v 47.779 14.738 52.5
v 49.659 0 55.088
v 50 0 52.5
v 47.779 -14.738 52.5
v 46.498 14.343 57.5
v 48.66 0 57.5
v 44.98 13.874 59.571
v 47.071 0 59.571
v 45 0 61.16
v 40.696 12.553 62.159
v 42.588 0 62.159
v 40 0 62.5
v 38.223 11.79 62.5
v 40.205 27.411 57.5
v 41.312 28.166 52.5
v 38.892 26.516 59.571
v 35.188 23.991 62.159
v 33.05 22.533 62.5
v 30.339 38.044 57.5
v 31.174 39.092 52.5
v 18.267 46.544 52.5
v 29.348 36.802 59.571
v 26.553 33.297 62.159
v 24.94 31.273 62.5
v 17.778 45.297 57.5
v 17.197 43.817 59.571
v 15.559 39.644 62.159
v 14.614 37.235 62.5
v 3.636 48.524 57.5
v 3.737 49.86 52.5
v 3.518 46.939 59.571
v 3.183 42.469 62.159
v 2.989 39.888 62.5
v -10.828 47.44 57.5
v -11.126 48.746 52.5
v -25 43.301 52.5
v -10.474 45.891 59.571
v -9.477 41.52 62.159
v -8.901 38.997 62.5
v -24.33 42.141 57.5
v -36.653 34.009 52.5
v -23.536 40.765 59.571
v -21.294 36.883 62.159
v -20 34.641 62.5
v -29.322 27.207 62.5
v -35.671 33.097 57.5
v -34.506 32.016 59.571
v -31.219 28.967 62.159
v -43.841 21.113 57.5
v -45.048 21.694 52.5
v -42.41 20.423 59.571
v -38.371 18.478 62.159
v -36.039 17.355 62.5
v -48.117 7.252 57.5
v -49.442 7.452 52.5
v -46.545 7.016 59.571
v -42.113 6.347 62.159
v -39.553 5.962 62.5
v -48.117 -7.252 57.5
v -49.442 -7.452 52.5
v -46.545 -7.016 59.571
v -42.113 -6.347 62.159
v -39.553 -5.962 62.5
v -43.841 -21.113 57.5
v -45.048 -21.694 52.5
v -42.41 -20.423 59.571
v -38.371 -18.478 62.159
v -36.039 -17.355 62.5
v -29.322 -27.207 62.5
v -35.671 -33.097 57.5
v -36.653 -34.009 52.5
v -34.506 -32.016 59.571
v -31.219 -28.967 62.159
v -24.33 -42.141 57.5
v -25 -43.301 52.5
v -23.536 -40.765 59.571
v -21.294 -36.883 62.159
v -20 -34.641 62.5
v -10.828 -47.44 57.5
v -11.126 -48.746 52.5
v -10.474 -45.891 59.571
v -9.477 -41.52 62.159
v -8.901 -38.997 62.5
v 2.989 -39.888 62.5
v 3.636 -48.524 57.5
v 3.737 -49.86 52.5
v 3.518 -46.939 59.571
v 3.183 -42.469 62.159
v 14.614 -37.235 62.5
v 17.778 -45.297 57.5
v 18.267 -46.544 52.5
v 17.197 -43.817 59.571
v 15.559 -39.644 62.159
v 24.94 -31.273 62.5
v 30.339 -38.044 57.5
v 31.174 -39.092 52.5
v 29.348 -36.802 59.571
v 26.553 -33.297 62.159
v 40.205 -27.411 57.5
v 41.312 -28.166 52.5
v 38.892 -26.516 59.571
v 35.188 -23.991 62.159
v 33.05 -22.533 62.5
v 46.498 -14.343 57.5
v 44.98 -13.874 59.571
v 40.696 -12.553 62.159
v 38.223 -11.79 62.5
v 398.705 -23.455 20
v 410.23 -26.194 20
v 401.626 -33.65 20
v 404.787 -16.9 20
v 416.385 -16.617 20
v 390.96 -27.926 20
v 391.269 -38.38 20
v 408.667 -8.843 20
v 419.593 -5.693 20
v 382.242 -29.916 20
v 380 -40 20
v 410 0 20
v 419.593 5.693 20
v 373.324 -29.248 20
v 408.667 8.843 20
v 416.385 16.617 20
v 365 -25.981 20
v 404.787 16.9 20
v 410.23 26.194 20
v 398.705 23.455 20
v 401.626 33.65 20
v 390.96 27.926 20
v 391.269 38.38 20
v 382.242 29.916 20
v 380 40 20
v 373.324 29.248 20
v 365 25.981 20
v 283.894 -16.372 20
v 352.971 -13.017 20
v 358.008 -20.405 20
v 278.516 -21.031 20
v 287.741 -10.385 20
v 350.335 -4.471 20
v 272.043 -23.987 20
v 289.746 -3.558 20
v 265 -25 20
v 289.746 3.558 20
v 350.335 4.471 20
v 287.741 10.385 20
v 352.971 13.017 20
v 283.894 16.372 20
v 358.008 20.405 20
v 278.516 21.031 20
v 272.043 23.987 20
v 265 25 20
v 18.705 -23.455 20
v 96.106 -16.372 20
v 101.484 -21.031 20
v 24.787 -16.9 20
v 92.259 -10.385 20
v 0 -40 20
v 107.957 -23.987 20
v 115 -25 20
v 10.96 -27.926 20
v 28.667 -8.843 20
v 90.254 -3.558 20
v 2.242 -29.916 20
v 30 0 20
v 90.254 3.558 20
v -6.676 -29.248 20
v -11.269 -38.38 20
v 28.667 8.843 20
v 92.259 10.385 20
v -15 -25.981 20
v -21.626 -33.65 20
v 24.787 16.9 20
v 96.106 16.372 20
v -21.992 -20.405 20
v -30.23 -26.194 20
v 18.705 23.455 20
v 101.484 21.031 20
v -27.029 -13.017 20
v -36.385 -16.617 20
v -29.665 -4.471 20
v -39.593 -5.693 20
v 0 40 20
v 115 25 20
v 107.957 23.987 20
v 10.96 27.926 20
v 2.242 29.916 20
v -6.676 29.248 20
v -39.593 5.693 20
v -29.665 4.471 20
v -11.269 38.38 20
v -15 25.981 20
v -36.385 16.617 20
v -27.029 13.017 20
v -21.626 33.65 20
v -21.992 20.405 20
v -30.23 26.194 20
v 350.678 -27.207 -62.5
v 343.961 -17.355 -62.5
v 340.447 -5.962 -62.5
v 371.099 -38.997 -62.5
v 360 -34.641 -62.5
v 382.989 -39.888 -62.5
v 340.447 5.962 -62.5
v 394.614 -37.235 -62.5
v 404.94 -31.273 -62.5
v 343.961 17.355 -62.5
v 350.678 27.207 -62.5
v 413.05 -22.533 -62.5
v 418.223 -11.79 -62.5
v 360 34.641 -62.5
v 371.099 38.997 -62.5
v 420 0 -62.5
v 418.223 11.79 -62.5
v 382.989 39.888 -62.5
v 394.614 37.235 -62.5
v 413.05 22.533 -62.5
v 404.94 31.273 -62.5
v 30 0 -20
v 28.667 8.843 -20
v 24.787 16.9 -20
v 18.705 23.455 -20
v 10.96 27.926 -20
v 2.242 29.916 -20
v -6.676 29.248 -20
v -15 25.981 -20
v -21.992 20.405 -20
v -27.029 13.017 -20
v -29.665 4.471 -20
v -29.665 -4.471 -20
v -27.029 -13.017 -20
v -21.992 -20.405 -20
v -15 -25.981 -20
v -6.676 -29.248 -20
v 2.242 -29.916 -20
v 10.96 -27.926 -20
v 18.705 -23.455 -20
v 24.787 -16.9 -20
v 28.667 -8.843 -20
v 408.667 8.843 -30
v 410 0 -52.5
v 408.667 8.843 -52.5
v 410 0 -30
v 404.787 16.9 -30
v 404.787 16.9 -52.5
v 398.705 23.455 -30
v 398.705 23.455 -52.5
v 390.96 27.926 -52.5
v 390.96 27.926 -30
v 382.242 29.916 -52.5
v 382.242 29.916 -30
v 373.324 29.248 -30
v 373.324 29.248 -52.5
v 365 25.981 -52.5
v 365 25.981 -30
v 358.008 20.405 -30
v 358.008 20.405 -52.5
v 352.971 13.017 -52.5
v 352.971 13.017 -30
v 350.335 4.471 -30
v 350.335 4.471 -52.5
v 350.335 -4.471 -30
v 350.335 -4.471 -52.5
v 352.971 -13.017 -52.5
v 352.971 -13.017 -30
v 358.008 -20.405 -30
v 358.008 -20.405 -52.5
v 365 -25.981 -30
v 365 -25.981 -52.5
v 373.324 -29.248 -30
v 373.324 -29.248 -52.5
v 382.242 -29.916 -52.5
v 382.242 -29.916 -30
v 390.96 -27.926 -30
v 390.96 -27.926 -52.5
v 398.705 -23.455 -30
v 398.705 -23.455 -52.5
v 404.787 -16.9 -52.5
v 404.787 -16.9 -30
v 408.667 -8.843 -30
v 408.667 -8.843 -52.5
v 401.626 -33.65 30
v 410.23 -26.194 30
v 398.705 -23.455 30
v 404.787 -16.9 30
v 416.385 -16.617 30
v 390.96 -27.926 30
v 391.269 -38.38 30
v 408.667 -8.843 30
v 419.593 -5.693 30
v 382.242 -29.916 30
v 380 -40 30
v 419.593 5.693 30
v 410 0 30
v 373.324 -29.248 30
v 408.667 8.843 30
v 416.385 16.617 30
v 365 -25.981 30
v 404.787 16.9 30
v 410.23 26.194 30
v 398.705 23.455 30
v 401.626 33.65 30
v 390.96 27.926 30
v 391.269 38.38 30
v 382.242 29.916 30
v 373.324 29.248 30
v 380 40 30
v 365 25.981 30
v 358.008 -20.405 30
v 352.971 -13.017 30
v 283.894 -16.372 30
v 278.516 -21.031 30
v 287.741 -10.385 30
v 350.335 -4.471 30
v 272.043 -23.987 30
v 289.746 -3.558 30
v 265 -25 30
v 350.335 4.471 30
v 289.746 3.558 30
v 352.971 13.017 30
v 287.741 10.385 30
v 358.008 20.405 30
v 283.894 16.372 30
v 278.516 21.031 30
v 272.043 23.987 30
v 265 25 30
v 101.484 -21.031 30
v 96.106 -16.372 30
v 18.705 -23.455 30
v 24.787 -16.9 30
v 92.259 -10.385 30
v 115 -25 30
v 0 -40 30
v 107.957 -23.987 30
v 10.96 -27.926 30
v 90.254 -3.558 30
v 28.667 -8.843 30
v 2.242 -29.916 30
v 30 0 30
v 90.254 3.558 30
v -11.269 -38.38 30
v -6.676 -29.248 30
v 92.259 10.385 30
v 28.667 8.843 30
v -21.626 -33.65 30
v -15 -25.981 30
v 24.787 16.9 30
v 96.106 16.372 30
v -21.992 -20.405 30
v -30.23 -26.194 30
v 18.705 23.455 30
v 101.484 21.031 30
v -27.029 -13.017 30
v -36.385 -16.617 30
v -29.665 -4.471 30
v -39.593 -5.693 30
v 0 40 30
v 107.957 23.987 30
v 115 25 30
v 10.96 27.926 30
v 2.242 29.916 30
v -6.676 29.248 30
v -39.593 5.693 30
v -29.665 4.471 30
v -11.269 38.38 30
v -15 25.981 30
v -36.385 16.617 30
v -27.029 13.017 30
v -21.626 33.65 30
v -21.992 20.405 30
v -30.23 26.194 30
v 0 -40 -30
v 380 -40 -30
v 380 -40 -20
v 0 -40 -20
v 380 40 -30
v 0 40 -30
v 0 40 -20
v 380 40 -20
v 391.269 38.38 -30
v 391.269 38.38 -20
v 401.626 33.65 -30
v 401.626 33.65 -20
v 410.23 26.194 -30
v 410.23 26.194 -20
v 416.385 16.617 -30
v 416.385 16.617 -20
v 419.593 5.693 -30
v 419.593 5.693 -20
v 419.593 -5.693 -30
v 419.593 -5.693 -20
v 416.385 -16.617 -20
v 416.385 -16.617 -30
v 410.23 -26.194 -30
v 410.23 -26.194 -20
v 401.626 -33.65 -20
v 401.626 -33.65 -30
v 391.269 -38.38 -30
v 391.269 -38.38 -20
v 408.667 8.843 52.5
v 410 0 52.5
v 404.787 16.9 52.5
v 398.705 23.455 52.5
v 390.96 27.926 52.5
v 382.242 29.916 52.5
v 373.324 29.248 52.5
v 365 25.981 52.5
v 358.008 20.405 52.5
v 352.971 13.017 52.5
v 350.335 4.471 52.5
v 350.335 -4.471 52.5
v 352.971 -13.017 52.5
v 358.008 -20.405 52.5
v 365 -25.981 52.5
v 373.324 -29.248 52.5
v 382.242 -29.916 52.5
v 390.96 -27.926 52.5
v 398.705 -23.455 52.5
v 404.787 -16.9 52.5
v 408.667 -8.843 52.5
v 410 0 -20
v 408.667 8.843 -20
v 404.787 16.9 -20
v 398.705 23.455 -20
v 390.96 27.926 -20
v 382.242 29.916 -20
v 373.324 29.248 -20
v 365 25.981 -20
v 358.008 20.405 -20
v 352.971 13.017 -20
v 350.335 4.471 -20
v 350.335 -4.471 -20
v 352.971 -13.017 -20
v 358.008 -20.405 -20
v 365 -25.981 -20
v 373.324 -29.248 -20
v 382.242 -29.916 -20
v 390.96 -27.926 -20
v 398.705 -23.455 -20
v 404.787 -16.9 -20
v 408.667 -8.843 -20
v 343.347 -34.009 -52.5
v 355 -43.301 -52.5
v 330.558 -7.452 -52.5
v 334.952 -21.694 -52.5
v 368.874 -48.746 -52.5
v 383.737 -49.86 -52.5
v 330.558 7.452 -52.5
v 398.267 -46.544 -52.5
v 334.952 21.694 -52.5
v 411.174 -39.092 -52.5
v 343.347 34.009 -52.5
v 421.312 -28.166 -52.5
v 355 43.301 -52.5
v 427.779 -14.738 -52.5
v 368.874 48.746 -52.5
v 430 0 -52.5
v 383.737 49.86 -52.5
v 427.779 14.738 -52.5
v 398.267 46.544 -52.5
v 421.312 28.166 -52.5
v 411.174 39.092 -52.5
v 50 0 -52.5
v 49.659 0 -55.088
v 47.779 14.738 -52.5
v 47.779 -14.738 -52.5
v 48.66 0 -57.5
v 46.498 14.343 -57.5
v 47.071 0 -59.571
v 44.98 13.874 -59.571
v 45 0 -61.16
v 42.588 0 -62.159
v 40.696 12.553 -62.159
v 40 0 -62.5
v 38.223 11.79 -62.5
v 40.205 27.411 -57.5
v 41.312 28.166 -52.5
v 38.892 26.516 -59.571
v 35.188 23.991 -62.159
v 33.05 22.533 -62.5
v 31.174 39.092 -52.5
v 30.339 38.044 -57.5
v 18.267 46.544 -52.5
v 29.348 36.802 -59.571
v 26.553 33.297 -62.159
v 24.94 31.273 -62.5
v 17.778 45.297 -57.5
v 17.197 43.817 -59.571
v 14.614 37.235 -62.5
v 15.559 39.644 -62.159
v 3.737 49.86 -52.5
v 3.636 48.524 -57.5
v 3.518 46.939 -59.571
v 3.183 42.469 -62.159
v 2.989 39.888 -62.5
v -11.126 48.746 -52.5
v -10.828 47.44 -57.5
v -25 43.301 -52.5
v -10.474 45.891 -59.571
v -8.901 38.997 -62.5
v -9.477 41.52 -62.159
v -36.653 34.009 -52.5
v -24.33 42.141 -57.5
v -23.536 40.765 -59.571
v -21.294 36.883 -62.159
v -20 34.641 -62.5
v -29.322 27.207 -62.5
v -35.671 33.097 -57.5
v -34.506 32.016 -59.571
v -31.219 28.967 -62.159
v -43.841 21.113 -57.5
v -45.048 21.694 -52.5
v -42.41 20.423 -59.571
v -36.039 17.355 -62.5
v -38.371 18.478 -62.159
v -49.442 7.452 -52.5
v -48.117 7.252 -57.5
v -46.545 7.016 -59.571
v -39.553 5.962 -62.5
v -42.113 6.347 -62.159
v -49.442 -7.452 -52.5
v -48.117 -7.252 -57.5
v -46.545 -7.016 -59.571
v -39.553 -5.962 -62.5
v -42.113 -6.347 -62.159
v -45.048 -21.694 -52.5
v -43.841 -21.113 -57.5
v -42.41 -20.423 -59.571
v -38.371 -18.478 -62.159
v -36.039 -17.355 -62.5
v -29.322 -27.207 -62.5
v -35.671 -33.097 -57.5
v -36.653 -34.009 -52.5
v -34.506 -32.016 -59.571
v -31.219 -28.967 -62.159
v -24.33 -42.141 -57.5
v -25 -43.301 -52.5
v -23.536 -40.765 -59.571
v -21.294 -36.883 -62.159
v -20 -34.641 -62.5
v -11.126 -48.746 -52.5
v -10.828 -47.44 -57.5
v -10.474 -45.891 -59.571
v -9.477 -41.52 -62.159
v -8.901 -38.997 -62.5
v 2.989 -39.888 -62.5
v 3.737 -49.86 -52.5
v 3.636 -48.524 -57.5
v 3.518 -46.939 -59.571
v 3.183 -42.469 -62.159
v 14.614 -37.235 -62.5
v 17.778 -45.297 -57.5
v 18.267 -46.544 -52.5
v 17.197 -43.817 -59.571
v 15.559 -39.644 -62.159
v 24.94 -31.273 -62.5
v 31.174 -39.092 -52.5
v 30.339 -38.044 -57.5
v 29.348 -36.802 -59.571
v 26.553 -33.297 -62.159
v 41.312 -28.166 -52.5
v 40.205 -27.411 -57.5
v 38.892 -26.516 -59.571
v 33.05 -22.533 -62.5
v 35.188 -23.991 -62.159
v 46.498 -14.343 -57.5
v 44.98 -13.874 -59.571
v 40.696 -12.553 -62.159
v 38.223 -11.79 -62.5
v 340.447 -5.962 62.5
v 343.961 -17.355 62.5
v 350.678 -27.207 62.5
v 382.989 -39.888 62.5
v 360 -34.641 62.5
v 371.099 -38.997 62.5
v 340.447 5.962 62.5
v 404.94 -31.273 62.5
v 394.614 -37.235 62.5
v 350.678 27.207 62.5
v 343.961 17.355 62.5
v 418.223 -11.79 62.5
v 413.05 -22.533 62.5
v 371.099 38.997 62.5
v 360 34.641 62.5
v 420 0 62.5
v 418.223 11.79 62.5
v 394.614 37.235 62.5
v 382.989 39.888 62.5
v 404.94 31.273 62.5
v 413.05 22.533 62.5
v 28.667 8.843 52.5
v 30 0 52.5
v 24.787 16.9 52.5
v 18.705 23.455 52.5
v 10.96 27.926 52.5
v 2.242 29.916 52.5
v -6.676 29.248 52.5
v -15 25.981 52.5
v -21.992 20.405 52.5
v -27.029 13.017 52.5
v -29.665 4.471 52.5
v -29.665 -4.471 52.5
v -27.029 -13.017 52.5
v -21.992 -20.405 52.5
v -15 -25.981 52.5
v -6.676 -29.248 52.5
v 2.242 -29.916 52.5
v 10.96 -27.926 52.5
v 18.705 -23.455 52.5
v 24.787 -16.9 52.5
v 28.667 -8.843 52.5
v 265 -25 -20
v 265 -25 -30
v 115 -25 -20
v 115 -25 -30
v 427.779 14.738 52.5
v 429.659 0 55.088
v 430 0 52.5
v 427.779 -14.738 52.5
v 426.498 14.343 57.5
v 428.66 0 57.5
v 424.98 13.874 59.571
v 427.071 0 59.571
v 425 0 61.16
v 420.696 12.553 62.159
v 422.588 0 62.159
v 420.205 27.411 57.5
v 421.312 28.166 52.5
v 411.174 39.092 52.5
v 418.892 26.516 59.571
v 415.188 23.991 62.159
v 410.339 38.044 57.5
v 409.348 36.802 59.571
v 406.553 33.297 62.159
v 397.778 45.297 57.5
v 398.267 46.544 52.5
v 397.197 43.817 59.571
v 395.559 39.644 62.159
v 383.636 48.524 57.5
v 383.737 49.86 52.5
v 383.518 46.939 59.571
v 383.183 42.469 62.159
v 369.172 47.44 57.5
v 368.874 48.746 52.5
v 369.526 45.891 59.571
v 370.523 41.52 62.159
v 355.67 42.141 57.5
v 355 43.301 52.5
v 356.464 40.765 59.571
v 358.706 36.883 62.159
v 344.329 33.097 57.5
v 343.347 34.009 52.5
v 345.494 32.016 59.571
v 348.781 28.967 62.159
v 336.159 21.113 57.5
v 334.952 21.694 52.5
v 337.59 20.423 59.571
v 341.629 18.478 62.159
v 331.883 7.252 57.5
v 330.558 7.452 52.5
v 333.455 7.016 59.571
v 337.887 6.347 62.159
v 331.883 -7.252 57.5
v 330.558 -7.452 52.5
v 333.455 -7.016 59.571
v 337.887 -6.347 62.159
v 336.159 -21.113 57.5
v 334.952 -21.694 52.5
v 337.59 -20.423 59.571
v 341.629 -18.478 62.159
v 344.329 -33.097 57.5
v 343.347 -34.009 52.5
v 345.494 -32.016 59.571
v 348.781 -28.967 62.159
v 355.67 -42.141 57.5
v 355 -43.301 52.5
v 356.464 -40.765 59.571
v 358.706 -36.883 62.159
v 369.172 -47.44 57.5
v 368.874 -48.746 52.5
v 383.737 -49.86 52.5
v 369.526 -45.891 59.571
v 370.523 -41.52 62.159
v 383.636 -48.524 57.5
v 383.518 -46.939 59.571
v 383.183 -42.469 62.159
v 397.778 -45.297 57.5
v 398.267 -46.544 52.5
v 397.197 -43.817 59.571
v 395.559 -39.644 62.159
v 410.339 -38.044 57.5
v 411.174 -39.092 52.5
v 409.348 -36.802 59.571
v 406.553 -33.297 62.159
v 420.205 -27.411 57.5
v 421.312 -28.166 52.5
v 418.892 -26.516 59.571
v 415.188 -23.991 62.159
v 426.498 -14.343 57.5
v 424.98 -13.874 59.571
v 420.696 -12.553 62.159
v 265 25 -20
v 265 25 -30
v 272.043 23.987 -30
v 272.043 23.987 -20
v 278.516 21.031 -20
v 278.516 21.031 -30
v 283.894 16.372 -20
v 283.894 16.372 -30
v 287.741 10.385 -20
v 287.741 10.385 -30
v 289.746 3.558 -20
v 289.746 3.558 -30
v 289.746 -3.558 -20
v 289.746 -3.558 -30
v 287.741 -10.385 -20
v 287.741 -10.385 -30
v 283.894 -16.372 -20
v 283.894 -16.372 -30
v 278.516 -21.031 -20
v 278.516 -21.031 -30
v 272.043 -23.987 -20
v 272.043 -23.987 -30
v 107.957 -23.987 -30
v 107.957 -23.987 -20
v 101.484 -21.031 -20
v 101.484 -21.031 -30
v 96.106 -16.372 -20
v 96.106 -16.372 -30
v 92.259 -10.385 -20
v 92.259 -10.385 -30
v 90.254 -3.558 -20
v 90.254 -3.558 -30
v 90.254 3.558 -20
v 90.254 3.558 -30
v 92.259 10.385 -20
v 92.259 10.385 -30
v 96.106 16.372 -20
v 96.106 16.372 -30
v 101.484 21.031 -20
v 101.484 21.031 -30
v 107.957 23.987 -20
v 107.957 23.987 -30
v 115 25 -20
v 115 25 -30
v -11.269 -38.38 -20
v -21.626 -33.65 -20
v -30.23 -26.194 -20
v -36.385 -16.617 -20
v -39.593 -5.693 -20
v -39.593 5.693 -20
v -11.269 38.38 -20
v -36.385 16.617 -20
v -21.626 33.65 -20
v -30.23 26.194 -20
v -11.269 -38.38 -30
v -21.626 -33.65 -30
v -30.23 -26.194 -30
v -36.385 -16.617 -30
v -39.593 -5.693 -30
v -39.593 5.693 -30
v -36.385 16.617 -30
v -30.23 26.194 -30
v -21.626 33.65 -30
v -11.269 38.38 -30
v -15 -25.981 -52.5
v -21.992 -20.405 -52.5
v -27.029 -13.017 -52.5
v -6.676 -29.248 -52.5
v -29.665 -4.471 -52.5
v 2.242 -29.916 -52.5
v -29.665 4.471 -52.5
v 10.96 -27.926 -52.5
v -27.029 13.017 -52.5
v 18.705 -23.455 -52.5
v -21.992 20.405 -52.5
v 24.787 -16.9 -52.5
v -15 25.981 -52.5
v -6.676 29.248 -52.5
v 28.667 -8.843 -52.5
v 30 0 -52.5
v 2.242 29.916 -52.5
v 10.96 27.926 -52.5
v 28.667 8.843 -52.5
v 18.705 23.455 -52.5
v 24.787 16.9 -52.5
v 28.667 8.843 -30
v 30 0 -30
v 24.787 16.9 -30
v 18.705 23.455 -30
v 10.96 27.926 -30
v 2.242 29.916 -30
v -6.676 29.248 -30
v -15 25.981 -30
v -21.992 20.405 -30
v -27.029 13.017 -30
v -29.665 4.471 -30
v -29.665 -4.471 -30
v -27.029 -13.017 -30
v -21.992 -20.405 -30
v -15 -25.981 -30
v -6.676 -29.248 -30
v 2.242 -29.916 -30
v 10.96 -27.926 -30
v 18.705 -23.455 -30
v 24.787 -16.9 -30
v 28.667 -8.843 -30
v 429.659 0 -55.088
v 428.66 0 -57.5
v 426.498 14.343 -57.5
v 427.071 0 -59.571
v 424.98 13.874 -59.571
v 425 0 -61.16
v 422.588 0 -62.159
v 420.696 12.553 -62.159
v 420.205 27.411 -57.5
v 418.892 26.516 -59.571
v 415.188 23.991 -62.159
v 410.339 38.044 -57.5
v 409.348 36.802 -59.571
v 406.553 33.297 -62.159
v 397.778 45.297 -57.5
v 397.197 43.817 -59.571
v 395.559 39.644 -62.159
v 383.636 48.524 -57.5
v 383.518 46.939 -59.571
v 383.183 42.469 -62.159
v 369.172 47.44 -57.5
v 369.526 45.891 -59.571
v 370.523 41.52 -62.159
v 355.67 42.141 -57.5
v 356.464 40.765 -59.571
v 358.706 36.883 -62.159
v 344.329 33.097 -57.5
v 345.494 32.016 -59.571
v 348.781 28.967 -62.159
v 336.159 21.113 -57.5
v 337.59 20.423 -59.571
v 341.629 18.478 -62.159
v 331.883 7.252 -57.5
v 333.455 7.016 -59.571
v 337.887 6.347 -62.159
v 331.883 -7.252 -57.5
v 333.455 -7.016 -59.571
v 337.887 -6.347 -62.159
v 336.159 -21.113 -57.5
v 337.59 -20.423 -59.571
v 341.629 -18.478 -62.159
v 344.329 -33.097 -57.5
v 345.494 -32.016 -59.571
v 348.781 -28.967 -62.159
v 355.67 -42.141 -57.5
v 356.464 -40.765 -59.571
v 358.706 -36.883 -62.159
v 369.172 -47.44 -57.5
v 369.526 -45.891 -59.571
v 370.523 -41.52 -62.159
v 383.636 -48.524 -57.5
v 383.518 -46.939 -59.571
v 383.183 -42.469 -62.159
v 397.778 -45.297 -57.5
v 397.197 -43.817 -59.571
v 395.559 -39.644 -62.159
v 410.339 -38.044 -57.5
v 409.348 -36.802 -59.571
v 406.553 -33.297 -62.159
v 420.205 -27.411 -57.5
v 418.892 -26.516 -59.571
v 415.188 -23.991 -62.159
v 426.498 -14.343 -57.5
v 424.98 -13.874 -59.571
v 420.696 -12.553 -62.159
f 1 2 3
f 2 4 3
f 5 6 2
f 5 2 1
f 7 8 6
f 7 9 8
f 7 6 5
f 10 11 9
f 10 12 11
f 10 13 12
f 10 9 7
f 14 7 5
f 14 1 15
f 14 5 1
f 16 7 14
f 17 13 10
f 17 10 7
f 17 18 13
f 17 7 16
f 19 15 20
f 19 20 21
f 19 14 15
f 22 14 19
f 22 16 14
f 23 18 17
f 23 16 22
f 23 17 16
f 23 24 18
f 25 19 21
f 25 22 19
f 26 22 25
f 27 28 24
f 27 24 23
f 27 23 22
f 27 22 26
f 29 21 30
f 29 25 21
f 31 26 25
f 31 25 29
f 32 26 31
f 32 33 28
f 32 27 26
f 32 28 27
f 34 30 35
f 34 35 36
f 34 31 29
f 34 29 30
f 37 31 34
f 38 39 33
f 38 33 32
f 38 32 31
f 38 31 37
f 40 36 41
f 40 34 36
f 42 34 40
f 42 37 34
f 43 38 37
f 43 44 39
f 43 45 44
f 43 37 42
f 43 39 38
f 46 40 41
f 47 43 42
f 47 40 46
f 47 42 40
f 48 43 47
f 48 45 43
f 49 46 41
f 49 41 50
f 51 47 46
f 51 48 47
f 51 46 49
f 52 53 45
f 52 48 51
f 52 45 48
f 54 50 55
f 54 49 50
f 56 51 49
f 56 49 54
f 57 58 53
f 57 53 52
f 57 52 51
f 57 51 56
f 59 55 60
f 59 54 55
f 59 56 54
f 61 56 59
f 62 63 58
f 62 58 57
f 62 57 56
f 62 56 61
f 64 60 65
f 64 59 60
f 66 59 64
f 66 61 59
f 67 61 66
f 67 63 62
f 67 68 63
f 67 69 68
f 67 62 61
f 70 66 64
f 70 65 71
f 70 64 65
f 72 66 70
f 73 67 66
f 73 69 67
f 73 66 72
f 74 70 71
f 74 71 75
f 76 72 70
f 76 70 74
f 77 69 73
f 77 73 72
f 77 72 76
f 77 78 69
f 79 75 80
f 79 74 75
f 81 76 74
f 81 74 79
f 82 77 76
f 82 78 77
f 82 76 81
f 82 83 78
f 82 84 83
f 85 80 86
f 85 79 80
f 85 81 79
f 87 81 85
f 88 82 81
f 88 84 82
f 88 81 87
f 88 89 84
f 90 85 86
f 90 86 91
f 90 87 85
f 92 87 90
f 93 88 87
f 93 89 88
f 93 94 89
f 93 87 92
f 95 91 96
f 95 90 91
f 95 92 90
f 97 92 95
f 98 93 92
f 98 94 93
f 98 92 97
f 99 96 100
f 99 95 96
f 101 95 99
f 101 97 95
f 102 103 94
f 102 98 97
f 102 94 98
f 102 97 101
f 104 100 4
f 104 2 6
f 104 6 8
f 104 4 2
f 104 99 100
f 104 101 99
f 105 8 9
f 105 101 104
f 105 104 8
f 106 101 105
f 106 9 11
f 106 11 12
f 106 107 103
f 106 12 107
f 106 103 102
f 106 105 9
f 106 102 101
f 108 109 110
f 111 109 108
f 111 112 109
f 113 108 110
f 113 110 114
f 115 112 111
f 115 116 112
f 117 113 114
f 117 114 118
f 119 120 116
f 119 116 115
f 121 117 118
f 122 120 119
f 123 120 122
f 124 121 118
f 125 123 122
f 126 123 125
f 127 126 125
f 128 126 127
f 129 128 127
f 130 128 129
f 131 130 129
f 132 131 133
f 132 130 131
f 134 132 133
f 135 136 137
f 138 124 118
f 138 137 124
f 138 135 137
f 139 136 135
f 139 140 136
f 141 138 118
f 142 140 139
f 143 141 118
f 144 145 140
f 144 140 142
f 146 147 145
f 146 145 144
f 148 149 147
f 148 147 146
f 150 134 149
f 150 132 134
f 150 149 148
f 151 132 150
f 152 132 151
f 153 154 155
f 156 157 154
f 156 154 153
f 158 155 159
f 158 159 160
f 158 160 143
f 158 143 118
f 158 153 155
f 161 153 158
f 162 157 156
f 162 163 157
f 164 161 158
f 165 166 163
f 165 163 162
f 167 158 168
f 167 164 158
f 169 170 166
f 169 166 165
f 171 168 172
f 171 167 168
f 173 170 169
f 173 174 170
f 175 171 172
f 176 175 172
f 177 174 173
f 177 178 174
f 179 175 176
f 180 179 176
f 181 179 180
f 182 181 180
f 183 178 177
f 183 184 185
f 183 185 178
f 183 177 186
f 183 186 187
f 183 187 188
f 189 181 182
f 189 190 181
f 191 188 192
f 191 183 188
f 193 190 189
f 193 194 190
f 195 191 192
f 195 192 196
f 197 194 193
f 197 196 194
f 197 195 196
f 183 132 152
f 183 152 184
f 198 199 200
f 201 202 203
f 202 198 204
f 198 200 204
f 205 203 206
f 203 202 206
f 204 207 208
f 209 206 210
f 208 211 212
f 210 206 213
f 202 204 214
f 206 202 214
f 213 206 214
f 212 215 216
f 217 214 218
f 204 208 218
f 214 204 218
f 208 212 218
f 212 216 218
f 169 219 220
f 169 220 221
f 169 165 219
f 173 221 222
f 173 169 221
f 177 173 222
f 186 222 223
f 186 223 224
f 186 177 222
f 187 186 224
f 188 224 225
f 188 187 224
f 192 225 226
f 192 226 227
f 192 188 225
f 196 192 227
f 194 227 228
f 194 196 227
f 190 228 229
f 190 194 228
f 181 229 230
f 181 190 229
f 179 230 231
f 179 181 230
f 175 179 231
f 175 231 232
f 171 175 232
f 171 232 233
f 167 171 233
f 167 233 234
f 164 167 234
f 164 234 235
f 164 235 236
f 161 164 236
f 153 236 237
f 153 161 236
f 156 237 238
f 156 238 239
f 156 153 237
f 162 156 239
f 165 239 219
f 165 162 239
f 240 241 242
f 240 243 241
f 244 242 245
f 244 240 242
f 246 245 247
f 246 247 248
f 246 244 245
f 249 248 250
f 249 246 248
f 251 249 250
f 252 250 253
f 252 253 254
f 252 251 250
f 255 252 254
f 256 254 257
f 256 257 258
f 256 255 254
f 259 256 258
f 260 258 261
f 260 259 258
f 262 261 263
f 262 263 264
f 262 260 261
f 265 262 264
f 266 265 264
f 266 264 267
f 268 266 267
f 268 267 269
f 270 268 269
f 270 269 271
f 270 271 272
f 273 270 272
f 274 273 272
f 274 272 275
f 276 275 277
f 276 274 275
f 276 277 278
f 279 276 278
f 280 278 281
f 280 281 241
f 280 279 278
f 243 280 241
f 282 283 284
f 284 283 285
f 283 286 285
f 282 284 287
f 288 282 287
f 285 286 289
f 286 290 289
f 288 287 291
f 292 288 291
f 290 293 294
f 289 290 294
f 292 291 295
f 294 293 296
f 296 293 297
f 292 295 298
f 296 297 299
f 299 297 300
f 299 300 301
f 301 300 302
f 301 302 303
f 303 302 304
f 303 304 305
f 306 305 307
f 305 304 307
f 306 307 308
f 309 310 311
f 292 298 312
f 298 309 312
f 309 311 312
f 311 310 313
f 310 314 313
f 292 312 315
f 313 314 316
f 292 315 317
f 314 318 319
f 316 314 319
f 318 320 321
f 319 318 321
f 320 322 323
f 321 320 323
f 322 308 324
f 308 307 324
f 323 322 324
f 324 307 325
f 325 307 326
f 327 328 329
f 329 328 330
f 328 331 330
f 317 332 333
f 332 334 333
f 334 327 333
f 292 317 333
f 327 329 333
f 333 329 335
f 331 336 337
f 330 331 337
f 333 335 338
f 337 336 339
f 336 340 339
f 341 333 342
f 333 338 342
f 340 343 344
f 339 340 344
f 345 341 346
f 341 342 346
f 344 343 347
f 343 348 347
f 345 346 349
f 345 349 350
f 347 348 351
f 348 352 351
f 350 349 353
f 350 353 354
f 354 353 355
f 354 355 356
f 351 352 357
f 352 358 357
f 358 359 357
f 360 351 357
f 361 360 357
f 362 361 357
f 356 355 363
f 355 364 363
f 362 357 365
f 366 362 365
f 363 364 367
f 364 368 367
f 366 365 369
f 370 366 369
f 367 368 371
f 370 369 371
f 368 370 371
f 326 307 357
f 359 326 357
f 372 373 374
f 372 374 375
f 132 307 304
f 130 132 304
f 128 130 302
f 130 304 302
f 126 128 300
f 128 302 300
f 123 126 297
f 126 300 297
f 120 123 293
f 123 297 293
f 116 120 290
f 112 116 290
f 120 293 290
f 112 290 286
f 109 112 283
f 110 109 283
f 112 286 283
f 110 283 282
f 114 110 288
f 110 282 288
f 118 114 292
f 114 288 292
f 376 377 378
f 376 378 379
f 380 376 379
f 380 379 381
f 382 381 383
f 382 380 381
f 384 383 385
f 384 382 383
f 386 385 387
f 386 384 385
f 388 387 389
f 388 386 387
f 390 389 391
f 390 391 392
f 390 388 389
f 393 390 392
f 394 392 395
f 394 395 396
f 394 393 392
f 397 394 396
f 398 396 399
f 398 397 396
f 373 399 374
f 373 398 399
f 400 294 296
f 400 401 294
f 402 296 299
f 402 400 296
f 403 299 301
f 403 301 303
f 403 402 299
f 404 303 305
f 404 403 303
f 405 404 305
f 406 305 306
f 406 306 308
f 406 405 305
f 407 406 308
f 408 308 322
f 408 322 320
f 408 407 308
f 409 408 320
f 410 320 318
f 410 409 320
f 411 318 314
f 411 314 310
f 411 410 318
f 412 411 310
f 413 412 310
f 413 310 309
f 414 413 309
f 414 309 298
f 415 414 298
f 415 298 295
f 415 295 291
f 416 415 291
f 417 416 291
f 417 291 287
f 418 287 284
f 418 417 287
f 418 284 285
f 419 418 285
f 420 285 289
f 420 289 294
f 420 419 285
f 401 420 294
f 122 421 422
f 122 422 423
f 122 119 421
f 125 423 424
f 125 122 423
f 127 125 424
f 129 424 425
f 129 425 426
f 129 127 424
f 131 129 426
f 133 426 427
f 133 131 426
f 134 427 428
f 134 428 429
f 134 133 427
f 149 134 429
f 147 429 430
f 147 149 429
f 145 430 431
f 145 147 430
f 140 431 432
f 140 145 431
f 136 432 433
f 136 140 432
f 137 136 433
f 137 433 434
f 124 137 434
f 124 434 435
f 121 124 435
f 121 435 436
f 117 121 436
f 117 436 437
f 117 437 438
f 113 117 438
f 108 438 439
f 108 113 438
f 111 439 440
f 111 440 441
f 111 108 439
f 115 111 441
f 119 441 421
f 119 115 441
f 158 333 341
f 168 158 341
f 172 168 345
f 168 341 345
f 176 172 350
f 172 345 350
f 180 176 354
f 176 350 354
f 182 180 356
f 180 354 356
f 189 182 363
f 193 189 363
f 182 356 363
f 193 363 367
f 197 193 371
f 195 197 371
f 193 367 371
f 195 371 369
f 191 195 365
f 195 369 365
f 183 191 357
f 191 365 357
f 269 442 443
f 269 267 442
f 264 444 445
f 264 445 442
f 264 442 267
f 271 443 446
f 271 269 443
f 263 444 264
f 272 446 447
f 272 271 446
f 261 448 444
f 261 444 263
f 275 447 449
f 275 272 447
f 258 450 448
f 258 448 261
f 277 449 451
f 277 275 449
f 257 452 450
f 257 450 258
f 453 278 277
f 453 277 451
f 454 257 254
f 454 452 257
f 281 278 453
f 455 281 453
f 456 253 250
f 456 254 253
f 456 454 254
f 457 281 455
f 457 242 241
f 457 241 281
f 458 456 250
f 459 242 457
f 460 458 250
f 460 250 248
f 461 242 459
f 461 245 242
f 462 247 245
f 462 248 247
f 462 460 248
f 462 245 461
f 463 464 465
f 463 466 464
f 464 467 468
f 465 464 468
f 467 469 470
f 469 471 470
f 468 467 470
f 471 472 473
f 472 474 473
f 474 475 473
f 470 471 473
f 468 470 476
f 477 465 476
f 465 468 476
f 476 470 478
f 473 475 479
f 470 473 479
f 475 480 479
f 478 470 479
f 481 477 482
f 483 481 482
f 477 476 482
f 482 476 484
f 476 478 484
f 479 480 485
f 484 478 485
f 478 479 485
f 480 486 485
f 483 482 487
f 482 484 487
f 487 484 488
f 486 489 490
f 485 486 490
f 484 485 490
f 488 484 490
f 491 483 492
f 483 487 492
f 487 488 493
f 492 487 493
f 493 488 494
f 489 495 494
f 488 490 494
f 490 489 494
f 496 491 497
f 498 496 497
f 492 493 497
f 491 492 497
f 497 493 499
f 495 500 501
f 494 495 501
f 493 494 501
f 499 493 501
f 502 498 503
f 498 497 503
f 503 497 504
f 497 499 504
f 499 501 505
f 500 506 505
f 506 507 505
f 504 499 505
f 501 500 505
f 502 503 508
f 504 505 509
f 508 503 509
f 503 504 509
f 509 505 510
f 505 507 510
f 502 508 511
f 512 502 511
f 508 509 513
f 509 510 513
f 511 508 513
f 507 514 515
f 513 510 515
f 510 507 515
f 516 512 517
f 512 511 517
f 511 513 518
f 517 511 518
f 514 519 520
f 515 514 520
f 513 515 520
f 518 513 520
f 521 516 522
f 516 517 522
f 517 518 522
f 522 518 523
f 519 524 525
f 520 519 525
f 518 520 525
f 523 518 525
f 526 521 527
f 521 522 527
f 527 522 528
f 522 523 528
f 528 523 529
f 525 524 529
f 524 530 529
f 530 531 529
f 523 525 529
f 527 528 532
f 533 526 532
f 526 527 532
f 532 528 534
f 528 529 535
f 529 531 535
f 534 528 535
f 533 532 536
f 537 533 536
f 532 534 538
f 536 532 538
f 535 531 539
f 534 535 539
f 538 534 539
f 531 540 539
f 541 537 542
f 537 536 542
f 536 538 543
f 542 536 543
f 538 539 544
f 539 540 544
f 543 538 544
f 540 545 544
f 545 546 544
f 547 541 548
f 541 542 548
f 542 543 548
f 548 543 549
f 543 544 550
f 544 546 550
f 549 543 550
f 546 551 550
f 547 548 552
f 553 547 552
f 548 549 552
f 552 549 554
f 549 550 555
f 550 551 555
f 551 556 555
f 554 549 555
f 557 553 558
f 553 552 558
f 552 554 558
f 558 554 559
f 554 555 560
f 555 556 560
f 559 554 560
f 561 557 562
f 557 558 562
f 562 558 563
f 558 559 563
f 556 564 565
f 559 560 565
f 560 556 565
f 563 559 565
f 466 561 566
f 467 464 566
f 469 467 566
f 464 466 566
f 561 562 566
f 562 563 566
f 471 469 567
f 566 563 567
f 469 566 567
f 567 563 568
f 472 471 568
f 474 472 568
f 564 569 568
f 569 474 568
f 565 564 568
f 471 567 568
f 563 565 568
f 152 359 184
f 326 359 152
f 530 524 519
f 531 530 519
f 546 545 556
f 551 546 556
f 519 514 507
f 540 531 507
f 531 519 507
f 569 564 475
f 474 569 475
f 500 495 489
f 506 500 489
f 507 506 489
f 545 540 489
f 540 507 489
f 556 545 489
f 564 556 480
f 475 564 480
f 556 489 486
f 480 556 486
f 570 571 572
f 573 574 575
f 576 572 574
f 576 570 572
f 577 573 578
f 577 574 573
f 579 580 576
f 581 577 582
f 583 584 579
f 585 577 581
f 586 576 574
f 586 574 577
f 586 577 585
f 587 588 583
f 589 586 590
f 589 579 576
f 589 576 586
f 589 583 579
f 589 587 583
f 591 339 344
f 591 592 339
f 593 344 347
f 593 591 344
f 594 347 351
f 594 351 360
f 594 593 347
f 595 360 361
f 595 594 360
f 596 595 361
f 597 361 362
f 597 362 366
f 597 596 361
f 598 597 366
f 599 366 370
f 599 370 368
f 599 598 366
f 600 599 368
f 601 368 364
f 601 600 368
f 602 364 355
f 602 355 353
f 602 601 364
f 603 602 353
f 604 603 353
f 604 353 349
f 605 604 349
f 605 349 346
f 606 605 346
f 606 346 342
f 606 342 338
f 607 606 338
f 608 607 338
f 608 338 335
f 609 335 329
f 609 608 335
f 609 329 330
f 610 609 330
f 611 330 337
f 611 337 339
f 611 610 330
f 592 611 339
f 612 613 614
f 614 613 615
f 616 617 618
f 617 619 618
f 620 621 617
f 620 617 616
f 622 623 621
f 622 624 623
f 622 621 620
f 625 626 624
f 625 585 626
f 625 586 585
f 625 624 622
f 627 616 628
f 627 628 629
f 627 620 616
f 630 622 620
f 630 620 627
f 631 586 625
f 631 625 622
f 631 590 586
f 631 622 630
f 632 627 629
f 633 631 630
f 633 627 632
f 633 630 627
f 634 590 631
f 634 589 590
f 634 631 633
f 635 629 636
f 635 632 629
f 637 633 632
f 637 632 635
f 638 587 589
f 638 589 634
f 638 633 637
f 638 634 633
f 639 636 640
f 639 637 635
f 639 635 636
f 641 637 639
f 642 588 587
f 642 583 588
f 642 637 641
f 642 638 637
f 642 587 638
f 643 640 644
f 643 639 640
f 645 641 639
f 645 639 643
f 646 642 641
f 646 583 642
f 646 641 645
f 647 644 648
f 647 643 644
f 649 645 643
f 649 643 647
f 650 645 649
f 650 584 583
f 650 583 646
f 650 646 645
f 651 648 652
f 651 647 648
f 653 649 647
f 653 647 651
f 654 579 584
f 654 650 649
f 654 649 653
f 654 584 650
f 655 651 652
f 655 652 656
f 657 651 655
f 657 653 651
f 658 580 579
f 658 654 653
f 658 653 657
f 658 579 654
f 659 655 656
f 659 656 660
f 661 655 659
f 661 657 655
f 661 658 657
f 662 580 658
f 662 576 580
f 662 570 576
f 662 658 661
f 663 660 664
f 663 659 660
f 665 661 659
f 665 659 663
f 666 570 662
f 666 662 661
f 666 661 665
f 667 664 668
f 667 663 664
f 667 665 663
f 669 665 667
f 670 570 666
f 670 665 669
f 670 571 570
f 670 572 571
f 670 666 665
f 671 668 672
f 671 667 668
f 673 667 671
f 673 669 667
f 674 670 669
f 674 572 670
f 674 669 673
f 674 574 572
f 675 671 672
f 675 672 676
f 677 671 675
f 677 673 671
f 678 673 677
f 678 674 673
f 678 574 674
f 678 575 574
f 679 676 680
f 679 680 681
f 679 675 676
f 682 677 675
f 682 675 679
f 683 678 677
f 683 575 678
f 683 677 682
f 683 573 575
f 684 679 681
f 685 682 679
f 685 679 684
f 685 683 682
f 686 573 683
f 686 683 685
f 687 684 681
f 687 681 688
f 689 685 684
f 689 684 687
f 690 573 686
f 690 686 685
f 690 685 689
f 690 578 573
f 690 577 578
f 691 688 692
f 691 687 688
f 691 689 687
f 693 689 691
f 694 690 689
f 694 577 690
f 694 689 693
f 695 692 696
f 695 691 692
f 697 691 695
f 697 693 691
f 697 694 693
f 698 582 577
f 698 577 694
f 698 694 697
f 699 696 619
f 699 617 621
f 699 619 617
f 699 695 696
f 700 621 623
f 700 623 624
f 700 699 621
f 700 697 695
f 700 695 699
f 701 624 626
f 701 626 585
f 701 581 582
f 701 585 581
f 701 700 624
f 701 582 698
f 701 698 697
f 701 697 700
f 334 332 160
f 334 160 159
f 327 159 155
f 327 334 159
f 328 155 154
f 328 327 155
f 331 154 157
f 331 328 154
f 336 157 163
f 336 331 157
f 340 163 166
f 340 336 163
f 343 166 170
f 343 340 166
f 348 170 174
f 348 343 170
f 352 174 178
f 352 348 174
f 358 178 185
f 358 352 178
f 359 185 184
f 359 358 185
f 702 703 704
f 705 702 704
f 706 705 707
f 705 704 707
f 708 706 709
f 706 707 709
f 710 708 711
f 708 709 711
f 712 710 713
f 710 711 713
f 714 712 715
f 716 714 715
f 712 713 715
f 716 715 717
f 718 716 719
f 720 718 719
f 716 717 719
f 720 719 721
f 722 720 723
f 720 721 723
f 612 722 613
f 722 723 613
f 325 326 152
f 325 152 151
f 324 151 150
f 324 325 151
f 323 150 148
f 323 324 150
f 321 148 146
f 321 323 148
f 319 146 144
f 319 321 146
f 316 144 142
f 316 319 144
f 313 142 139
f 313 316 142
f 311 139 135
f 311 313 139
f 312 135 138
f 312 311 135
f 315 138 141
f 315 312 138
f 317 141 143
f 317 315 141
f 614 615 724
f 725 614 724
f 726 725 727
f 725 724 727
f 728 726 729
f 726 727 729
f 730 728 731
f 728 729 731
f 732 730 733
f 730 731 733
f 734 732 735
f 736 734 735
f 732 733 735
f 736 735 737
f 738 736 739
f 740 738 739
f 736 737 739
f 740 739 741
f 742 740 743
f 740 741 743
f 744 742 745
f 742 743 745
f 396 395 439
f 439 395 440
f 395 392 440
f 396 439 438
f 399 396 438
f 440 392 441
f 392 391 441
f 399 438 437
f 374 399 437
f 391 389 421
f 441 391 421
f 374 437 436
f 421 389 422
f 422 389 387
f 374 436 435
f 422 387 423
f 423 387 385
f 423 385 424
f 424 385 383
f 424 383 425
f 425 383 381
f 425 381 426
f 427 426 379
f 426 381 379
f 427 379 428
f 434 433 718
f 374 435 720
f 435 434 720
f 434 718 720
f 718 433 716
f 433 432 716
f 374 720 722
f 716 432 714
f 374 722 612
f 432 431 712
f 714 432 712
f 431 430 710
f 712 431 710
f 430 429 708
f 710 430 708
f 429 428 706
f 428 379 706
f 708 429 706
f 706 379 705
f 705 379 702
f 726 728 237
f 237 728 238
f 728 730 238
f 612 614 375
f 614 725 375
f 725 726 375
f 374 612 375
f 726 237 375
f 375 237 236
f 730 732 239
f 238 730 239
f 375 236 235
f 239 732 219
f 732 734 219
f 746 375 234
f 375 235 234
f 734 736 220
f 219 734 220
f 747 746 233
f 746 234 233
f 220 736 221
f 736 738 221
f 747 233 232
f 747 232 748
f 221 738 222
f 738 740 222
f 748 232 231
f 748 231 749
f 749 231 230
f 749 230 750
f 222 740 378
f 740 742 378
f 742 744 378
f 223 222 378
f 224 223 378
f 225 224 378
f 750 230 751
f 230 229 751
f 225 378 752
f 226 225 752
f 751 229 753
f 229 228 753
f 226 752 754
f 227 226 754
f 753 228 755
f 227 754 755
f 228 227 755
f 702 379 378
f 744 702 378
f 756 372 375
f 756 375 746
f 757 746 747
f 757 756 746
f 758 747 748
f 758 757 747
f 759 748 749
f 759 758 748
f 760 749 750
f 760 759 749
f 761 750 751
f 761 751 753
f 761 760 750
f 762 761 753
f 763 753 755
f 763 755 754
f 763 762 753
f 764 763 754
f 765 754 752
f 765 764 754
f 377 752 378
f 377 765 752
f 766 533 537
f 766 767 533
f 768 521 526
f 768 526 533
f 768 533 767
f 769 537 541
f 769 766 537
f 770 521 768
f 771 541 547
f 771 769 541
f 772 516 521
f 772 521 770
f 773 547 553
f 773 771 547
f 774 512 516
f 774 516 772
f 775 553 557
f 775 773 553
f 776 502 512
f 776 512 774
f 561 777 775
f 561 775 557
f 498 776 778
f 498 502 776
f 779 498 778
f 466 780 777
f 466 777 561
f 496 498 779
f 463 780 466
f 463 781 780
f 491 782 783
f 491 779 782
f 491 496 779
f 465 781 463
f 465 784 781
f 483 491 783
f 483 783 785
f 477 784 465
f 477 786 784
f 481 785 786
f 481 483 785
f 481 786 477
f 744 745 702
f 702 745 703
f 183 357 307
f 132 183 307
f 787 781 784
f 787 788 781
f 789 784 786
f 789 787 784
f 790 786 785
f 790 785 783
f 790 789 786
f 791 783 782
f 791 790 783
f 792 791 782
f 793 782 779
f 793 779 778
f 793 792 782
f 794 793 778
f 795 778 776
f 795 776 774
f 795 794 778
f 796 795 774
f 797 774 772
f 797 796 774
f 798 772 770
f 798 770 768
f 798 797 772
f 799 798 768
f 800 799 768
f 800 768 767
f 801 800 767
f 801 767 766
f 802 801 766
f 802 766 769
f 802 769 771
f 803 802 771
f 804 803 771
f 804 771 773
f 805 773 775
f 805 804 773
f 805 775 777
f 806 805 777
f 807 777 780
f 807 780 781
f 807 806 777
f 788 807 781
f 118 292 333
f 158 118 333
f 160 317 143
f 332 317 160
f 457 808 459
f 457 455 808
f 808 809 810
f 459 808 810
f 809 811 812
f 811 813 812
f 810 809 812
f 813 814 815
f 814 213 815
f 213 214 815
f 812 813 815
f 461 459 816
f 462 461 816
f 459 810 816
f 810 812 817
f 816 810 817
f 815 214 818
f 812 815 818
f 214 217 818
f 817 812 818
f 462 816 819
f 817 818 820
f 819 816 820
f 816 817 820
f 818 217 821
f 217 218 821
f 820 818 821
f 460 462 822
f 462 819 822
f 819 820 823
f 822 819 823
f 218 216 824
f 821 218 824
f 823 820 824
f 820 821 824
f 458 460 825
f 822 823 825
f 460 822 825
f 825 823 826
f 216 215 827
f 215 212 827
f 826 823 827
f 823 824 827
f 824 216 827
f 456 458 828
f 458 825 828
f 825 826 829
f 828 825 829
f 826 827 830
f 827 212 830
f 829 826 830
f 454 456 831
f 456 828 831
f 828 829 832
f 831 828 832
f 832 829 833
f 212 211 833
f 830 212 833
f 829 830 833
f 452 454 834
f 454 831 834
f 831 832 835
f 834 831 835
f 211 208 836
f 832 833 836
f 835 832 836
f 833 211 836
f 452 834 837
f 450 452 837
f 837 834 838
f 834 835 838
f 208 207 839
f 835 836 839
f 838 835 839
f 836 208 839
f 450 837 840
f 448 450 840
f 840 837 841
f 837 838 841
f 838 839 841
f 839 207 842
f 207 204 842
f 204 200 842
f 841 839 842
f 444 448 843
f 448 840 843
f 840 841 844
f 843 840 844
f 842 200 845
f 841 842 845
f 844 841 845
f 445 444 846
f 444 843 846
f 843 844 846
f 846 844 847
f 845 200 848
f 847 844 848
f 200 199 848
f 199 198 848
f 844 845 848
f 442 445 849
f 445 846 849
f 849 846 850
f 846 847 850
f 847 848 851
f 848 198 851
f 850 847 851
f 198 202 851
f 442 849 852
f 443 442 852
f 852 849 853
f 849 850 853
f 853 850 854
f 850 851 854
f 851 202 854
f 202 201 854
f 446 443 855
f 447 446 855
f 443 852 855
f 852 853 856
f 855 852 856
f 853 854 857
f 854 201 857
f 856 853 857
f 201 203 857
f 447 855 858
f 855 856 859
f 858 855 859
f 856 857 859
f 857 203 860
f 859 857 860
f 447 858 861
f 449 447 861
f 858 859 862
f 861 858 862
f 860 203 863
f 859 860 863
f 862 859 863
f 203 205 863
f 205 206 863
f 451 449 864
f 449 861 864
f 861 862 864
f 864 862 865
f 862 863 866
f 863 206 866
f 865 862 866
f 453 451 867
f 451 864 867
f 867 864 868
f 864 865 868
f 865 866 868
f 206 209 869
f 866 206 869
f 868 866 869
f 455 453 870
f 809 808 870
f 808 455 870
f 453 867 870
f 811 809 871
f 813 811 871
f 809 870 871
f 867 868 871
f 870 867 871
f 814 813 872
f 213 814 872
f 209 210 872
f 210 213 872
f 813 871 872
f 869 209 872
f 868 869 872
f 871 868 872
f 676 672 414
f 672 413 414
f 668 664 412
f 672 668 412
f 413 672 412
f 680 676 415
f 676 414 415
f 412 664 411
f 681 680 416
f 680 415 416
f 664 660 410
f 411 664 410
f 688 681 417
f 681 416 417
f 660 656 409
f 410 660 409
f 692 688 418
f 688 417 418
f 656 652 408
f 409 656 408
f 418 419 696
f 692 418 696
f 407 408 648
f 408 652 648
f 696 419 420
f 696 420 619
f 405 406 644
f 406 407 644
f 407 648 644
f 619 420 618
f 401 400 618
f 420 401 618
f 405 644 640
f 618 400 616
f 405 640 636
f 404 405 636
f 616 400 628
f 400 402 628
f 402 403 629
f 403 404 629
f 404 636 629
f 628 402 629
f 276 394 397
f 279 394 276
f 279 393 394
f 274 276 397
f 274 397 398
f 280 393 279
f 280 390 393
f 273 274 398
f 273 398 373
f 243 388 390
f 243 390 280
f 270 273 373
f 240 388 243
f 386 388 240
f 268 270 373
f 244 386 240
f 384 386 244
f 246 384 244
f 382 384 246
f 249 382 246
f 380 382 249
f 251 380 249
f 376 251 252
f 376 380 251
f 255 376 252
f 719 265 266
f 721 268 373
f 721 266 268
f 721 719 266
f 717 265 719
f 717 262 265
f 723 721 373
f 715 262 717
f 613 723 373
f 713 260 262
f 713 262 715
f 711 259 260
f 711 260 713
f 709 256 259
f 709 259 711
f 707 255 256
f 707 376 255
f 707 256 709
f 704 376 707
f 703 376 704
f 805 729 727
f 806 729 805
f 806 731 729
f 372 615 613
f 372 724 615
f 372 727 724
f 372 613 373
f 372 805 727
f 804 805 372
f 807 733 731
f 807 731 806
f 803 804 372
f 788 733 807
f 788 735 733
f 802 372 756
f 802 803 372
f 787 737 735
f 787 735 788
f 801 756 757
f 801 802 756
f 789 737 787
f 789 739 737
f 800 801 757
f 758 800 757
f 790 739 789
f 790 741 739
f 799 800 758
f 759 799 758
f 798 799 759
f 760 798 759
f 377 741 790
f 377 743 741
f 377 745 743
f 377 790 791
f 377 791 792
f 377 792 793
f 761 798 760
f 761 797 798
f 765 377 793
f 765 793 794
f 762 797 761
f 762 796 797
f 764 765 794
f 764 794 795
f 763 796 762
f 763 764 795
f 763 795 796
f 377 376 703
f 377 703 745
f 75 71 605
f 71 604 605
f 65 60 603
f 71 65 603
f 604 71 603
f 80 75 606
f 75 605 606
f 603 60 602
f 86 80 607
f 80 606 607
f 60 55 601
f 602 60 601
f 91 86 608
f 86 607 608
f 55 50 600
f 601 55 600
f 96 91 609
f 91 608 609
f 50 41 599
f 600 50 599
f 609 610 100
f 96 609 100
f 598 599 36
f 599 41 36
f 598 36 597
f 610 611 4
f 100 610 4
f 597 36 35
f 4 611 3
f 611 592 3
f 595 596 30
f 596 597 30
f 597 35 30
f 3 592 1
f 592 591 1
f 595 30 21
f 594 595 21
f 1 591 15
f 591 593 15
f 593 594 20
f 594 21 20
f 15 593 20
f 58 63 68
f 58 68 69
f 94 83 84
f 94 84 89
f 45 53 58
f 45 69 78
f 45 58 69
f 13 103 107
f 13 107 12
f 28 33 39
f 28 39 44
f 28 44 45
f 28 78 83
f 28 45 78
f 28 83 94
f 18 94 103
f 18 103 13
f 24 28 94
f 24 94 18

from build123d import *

# Parameters (mm, degrees)
SKETCH2_R            = 30
BOSS_EXTRUDE1_DEPTH  = 52.5
BOSS_EXTRUDE2_DEPTH  = 10
CUT_EXTRUDE1_DEPTH   = 430.890974551
SKETCH5_R            = 30
BOSS_EXTRUDE3_DEPTH  = 52.5
SKETCH6_R            = 50
BOSS_EXTRUDE4_DEPTH  = 10
FILLET1_R            = 10
FILLET1_OF_MIRROR3_R = 10


with BuildPart() as part:
    # Sketch2 → Boss-Extrude1 (new, symmetric)
    with BuildSketch(Plane.XY):
        Circle(SKETCH2_R)
    extrude(amount=BOSS_EXTRUDE1_DEPTH, both=True)

    # Sketch3 → Boss-Extrude2 (add)
    with BuildSketch(Plane.XY.offset(30)):
        with BuildLine():
            Line((0, 40), (380, 40))
            ThreePointArc((380, 40), (420, 0), (380, -40))
            Line((380, -40), (0, -40))
            ThreePointArc((0, -40), (-40, 0), (0, 40))
        make_face()
    boss_extrude2 = extrude(amount=-BOSS_EXTRUDE2_DEPTH)

    # Sketch4 → Cut-Extrude1 (cut, through all)
    with BuildSketch(Plane.XY.offset(30)):
        with BuildLine():
            Line((265, -25), (115, -25))
            ThreePointArc((115, -25), (90, 0), (115, 25))
            Line((115, 25), (265, 25))
            ThreePointArc((265, 25), (290, 0), (265, -25))
        make_face()
    cut_extrude1 = extrude(amount=-CUT_EXTRUDE1_DEPTH, mode=Mode.SUBTRACT)

    # Sketch5 → Boss-Extrude3 (add, symmetric)
    with BuildSketch(Plane.XY):
        with Locations((380, 0)):
            Circle(SKETCH5_R)
    extrude(amount=BOSS_EXTRUDE3_DEPTH, both=True)

    # Mirror1: Boss-Extrude2, Cut-Extrude1 across plane
    add(boss_extrude2.mirror(Plane.XY))
    add(cut_extrude1.mirror(Plane.XY), mode=Mode.SUBTRACT)

    # Sketch6 → Boss-Extrude4 (add)
    with BuildSketch(Plane.XY.offset(52.5)):
        Circle(SKETCH6_R)
        with Locations((380, 0)):
            Circle(SKETCH6_R)
    boss_extrude4 = extrude(amount=BOSS_EXTRUDE4_DEPTH)

    # Fillet1
    fillet1_edges = [part.edges().sort_by_distance(p)[0] for p in [
        (-50, 0, 62.5),
        (330, 0, 62.5),
    ]]
    fillet(fillet1_edges, radius=FILLET1_R - 0.0001)  # a hair under: the kernel refuses the full size

    # Mirror3: Boss-Extrude4 across plane
    add(boss_extrude4.mirror(Plane.XY))

    # Fillet1 of Mirror3
    fillet1_of_mirror3_edges = [part.edges().sort_by_distance(p)[0] for p in [
        (-50, 0, -62.5),
        (330, 0, -62.5),
    ]]
    fillet(fillet1_of_mirror3_edges, radius=FILLET1_OF_MIRROR3_R - 0.0001)  # a hair under: the kernel refuses the full size


solid = part.part
